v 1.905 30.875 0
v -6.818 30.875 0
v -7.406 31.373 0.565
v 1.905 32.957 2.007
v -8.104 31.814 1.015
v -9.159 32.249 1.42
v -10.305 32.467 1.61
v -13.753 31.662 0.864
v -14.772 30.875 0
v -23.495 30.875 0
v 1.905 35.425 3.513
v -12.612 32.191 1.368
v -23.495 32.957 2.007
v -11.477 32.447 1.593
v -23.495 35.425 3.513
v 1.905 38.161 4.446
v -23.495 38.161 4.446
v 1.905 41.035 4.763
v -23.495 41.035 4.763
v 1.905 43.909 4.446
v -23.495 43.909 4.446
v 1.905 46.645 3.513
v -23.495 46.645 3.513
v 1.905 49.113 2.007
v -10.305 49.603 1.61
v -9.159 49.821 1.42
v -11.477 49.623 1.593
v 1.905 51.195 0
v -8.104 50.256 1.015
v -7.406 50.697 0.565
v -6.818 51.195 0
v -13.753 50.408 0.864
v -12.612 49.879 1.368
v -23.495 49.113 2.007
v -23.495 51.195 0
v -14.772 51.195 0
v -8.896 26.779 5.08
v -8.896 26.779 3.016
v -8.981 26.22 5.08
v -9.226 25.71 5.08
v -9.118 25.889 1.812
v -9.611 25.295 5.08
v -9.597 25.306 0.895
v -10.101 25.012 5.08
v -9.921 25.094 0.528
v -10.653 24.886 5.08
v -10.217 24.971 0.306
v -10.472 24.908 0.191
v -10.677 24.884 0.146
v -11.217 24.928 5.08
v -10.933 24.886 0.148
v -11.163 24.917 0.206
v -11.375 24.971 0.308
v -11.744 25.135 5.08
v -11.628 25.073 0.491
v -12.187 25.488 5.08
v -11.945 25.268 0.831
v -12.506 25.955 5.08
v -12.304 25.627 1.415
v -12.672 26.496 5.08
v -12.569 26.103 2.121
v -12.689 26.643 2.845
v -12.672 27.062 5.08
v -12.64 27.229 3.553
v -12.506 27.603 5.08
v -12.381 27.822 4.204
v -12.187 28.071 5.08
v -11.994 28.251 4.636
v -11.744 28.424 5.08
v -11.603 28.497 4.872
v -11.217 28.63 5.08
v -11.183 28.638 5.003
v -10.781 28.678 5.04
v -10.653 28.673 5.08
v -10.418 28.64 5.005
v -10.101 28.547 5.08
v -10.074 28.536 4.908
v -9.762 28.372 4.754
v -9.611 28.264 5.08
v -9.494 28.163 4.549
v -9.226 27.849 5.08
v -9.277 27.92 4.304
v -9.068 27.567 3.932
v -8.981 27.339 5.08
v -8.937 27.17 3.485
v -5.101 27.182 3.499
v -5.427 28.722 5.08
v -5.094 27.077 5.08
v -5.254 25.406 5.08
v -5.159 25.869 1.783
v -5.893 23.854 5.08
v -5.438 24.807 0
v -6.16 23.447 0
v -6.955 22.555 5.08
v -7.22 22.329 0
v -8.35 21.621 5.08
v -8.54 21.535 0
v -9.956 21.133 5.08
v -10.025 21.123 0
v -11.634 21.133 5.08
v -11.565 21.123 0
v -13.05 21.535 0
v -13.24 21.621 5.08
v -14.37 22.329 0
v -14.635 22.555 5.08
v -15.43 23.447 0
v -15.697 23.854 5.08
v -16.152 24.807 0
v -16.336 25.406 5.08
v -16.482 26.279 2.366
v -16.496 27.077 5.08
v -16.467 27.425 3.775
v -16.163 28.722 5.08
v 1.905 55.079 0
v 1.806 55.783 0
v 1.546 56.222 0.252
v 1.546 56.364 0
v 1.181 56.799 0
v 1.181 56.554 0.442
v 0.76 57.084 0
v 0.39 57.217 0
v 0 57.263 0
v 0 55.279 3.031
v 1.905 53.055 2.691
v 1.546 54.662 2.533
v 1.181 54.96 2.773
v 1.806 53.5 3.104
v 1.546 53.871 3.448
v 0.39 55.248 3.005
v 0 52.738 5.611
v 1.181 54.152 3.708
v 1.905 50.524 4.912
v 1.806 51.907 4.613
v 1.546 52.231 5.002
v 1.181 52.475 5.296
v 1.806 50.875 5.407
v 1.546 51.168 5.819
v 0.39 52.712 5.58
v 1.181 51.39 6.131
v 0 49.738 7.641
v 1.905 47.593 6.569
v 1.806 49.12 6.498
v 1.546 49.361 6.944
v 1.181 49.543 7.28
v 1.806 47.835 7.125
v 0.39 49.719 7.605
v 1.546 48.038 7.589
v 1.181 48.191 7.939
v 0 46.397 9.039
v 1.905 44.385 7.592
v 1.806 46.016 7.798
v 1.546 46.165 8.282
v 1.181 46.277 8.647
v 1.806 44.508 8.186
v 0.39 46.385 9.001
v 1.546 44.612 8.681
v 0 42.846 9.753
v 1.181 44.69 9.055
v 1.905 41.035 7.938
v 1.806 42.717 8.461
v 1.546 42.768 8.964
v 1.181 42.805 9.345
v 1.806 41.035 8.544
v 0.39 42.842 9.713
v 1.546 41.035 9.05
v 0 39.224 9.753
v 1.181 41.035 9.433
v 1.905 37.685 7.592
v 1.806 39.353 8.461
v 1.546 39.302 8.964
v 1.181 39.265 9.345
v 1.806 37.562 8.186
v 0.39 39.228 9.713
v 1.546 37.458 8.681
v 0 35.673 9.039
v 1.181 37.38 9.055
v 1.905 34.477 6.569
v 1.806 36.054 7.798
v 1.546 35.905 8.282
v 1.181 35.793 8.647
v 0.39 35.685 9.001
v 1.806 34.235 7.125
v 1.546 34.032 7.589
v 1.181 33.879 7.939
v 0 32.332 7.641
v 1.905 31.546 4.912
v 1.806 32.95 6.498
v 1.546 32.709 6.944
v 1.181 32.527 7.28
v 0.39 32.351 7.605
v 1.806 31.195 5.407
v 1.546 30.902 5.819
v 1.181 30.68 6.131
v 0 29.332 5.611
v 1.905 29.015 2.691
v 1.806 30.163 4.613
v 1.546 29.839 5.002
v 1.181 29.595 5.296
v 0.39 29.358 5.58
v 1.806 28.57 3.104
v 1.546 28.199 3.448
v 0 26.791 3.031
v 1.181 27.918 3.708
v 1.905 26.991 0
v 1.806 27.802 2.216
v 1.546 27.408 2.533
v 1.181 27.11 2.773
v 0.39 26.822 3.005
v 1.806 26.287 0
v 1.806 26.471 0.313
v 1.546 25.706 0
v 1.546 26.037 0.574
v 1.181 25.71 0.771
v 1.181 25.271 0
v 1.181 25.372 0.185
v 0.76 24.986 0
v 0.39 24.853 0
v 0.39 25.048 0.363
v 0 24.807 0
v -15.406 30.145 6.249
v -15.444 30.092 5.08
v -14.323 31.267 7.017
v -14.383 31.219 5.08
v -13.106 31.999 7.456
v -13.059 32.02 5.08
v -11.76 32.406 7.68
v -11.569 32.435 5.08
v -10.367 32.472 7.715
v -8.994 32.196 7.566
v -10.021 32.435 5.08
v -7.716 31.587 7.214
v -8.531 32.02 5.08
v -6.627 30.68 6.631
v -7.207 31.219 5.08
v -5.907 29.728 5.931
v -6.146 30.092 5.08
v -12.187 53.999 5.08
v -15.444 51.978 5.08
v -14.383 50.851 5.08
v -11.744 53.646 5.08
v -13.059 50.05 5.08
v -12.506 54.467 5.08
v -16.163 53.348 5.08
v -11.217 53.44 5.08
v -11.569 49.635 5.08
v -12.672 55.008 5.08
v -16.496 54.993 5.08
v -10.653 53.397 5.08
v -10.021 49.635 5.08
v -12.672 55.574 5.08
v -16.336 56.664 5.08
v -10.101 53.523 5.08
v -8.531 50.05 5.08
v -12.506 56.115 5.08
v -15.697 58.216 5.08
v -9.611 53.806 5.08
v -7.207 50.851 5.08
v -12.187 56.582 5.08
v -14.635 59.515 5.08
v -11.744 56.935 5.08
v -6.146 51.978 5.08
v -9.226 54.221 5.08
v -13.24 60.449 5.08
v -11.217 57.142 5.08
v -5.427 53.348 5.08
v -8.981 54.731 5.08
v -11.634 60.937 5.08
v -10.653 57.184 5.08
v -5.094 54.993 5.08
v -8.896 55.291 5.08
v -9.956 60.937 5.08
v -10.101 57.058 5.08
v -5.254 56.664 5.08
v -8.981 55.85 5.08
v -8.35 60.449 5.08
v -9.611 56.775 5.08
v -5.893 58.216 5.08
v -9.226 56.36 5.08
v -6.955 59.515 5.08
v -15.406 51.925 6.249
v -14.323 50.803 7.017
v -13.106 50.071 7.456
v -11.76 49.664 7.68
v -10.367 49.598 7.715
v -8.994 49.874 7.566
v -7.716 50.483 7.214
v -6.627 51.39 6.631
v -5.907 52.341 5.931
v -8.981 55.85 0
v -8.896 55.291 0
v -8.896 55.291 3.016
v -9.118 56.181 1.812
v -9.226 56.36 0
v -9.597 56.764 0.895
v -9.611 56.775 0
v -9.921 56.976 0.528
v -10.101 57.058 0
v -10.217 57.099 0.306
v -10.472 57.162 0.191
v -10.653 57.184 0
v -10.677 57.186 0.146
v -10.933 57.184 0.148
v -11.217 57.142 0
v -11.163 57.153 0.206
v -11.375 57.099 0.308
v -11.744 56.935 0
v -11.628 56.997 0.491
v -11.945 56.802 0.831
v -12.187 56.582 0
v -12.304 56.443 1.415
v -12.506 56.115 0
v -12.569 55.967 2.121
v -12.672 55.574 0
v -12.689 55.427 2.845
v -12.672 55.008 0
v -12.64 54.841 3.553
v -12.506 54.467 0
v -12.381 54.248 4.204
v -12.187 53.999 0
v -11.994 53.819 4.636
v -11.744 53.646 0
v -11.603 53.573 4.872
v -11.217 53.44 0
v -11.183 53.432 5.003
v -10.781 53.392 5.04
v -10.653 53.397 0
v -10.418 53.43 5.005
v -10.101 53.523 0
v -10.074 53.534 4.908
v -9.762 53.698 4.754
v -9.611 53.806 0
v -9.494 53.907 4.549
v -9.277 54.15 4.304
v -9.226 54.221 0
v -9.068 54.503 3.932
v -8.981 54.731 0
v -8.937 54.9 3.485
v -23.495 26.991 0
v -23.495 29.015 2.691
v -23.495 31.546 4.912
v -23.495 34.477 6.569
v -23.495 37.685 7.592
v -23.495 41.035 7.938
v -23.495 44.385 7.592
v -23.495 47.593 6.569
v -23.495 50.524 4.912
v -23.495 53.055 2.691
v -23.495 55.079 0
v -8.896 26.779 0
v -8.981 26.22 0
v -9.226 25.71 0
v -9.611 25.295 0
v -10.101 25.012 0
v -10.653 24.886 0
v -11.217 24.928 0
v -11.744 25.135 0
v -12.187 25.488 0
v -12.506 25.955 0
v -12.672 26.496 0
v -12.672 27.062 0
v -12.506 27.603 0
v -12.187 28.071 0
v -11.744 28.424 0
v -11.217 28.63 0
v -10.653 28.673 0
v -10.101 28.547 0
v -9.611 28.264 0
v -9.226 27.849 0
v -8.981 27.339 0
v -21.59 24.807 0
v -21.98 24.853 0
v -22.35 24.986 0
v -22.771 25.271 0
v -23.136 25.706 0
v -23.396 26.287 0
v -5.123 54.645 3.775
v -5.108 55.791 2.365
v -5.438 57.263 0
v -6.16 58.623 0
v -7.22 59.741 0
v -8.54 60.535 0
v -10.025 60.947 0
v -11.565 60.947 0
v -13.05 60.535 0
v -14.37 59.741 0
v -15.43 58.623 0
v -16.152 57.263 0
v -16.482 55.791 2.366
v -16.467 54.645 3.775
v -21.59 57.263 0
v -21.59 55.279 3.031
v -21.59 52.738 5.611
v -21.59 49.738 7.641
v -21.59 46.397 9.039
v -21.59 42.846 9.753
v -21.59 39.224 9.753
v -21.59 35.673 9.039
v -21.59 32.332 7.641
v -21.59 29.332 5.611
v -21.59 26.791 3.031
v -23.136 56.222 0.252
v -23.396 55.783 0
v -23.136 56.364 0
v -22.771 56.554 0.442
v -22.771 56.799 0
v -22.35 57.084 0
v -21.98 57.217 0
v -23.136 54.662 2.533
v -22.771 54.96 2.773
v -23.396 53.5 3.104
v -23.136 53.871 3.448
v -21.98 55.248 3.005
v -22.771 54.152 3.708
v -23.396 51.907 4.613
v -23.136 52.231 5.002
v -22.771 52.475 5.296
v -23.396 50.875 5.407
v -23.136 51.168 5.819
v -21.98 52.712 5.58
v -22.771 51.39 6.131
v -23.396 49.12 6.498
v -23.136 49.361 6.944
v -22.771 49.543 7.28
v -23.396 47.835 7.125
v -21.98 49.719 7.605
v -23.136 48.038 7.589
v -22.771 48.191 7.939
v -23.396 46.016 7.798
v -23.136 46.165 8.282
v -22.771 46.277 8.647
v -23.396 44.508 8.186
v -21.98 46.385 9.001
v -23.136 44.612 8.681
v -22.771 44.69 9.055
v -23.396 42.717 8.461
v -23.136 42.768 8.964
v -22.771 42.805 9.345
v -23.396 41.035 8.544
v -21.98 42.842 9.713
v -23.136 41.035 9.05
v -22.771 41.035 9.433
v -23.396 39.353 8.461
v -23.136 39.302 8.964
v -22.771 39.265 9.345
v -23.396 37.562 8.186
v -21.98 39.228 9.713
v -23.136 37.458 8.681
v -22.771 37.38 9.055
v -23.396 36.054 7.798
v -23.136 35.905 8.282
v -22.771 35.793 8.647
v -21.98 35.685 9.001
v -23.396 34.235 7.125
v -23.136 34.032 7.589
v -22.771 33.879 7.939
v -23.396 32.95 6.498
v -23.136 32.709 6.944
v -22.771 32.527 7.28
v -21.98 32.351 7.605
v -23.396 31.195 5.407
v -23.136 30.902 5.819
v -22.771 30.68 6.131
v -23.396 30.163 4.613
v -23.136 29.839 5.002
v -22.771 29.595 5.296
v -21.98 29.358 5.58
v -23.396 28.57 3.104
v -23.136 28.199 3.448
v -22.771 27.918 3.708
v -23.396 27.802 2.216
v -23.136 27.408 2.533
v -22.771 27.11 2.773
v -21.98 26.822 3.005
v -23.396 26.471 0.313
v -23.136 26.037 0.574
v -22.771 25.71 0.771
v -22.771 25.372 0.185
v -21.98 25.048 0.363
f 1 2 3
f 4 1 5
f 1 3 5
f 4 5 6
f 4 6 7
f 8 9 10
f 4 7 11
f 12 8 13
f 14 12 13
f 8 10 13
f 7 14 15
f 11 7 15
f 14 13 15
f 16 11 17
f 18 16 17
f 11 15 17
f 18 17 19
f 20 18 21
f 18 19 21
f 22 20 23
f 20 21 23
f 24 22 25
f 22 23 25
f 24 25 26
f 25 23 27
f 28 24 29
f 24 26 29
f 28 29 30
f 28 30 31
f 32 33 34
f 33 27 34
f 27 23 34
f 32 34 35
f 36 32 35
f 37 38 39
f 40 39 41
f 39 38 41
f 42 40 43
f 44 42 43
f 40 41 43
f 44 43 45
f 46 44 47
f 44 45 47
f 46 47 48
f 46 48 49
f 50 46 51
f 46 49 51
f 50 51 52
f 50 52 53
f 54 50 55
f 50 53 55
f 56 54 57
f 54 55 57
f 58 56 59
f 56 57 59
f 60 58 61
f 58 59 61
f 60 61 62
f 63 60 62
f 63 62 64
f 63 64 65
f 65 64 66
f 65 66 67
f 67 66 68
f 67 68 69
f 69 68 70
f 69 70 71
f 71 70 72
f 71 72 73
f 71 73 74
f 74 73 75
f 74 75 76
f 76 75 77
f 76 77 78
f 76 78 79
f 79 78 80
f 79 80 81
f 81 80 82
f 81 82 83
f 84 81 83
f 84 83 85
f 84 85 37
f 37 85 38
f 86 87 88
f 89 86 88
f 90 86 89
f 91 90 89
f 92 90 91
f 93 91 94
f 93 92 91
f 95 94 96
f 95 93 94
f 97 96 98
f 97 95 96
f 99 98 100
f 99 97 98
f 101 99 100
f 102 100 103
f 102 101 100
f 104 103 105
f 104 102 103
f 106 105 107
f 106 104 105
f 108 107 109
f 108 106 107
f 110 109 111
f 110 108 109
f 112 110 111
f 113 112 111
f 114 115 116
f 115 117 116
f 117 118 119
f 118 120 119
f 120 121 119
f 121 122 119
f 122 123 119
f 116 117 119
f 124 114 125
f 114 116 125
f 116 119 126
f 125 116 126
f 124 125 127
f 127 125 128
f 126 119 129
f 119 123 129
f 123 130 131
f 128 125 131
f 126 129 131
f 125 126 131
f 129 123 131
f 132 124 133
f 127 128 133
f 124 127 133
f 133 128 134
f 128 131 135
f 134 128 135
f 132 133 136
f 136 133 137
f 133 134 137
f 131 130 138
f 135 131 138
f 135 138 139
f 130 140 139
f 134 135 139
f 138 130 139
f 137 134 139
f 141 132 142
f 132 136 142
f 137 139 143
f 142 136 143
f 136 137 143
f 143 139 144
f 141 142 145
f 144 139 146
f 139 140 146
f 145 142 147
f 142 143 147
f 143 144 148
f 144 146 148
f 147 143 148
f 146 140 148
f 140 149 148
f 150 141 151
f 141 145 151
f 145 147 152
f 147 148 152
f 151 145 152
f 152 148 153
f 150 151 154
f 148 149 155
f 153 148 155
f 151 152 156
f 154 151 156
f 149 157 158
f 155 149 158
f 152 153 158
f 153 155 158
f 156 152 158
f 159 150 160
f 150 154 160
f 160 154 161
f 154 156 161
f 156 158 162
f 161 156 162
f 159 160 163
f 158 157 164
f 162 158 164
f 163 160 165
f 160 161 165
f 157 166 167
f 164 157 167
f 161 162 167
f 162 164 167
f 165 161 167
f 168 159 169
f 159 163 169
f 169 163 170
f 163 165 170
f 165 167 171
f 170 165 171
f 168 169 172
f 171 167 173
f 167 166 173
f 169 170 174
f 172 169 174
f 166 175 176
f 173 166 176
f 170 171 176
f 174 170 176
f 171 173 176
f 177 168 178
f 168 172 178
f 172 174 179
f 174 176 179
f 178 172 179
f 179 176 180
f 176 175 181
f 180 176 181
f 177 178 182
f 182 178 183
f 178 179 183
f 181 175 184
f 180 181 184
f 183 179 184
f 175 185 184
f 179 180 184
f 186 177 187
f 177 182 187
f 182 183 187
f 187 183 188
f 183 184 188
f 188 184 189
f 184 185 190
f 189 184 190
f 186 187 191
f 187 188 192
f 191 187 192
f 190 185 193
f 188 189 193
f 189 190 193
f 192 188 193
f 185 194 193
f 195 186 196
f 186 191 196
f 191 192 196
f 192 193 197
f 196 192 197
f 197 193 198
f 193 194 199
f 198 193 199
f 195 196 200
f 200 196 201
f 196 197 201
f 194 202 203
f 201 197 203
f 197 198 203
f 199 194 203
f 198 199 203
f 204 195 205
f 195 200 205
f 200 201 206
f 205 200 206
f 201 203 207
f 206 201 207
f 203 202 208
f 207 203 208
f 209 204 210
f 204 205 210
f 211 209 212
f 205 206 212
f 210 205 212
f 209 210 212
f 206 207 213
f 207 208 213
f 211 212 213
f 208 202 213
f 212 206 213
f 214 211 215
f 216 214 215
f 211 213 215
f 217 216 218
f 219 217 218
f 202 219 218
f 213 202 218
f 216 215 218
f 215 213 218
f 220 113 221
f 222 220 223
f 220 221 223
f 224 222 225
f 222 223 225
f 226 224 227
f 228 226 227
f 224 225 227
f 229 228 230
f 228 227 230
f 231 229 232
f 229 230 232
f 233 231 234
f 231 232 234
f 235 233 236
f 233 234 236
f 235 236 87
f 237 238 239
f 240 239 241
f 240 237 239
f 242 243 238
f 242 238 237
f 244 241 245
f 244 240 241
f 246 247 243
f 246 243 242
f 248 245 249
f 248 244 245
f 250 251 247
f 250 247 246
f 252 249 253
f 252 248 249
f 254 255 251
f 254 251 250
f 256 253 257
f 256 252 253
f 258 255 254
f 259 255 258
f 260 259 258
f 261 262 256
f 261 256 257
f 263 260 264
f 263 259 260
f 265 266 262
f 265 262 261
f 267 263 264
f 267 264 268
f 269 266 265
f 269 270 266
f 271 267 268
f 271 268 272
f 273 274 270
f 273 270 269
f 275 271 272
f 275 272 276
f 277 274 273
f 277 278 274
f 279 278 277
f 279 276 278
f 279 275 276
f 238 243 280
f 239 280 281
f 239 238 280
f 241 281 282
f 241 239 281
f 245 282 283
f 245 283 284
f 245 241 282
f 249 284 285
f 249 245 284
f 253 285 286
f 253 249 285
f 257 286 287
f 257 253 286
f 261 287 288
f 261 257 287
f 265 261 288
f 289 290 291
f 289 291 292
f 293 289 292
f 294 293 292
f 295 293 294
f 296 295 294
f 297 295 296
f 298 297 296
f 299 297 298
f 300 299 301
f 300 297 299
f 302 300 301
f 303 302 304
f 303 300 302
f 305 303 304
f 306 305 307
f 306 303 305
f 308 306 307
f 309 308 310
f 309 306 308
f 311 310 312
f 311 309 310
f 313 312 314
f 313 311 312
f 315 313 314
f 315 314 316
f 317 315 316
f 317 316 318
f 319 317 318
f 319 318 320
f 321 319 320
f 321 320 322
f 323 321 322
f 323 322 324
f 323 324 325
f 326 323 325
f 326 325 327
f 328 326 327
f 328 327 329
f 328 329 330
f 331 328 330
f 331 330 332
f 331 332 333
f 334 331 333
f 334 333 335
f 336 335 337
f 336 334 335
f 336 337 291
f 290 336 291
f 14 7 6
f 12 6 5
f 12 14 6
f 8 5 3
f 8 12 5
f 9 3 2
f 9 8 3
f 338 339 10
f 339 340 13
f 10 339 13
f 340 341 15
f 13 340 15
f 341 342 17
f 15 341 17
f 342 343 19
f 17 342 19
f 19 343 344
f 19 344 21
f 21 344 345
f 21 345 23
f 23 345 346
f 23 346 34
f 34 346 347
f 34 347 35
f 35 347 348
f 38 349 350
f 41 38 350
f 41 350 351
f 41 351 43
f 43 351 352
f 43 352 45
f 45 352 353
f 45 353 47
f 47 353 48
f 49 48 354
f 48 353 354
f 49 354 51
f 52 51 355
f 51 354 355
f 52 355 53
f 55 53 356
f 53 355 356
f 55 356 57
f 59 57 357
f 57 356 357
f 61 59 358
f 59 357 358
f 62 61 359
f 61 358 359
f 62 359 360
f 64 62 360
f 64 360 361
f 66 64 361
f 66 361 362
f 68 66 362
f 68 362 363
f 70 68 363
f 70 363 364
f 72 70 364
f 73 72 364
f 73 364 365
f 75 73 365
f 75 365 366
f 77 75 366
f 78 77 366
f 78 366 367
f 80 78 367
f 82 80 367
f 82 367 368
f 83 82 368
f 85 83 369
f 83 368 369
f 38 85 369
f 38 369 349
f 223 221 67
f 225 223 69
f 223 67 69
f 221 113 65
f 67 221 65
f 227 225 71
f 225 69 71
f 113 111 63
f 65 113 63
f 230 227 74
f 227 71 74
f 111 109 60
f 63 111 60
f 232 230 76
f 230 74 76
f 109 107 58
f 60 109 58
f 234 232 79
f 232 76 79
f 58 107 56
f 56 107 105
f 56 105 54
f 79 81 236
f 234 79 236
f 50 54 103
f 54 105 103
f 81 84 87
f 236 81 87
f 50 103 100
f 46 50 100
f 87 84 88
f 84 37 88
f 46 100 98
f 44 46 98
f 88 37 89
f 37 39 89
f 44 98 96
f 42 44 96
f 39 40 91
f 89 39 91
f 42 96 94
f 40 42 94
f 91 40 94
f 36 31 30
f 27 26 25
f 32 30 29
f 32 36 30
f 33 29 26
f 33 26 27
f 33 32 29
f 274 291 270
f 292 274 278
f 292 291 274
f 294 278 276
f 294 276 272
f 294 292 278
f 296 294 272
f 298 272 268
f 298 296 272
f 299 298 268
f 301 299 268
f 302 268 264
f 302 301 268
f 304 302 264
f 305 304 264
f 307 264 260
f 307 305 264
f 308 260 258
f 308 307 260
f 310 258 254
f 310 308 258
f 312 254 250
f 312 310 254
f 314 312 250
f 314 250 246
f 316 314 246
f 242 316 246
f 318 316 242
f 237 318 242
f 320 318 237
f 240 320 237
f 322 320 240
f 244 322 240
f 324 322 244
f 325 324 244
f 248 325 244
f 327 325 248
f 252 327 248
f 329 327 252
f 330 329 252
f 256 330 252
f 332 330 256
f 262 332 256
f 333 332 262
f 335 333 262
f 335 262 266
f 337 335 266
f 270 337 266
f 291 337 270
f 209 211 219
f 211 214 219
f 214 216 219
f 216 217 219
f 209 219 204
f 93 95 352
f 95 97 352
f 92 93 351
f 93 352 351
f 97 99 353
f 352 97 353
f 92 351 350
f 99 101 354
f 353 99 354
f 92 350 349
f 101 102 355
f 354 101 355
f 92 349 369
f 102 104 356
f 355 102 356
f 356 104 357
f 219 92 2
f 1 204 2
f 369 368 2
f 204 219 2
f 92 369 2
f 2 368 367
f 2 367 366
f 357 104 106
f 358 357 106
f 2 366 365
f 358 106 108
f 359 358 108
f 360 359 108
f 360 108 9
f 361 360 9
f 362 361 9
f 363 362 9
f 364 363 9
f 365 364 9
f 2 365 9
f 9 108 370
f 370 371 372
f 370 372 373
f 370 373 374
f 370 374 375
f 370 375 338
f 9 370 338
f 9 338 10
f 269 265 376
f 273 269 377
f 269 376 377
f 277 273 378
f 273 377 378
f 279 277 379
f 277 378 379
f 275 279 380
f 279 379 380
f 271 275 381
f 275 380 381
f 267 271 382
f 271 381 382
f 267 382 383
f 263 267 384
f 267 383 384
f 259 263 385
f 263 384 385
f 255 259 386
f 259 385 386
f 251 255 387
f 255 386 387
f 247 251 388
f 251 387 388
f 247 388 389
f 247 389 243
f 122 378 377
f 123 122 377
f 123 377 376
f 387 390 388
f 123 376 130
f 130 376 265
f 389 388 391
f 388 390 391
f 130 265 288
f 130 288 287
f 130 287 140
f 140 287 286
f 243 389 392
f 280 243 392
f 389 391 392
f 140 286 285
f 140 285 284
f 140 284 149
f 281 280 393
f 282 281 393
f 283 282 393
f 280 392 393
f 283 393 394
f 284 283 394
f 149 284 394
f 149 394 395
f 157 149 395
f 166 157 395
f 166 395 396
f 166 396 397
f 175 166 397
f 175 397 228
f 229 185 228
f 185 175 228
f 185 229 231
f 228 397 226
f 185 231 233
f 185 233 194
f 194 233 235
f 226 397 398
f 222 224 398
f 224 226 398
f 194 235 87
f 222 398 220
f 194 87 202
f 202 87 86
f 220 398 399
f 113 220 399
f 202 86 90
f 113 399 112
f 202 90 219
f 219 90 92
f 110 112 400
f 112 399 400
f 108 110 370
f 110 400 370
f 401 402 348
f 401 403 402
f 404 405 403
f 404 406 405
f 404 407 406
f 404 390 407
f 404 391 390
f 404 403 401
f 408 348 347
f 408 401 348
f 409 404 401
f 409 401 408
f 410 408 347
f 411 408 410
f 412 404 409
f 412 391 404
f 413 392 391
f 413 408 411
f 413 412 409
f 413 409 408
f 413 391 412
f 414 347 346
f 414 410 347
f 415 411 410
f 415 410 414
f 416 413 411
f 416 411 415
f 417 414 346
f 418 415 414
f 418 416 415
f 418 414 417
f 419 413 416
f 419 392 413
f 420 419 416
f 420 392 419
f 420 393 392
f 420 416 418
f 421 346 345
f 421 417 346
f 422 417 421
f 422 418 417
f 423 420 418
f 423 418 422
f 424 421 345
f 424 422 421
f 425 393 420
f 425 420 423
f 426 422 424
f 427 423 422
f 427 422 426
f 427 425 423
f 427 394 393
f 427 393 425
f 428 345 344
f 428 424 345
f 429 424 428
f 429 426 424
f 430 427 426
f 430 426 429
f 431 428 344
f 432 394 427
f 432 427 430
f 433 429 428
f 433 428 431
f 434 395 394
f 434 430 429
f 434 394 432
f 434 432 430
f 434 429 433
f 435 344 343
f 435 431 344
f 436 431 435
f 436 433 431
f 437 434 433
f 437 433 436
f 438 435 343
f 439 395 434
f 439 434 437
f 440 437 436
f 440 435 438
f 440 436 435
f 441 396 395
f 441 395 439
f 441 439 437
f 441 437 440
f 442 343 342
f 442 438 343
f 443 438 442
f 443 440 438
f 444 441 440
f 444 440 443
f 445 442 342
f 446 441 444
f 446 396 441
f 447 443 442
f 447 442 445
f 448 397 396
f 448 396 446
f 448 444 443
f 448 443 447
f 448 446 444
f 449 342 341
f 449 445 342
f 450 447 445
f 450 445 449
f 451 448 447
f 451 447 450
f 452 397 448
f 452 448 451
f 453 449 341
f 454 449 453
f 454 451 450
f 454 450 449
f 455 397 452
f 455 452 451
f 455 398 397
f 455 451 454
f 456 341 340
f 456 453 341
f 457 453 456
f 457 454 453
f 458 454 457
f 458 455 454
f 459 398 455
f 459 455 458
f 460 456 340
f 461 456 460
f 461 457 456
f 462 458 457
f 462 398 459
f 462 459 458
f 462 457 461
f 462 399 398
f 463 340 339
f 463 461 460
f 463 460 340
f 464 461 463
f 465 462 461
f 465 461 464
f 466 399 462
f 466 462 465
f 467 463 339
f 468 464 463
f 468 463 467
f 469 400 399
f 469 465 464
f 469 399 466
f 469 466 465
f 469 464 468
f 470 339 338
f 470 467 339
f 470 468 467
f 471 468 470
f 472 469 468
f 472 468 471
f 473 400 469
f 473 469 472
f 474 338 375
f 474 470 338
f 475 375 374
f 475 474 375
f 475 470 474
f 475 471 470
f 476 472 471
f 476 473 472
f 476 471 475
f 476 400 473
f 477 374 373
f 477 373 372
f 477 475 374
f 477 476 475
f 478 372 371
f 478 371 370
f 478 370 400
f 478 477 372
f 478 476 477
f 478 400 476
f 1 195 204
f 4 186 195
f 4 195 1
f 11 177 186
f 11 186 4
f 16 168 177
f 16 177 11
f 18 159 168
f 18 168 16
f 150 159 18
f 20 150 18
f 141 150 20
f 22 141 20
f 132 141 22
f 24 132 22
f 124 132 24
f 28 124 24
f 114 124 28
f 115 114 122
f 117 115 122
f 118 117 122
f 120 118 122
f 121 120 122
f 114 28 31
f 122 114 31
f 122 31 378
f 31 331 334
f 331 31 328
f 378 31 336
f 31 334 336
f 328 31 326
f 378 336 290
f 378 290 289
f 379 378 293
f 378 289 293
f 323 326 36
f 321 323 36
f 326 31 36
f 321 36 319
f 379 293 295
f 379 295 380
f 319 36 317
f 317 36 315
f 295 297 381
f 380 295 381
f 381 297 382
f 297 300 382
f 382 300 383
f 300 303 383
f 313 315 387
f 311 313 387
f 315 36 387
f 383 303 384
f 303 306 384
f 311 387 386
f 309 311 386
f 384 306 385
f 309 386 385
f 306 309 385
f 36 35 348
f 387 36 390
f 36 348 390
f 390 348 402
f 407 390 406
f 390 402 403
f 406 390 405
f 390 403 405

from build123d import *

# Parameters (mm, degrees)
BOSS_EXTRUDE2_DEPTH = 25.4
CUT_EXTRUDE7_START  = -1
SKETCH5_5_R         = 1.89865
CUT_EXTRUDE7_DEPTH  = 11.8425
SKETCH8_R           = 5.70865
SKETCH8_R_2         = 1.89865
BOSS_EXTRUDE4_DEPTH = 5.08
CUT_EXTRUDE8_START  = 5.08
SKETCH8_3_R         = 5.70865
SKETCH8_3_R_2       = 1.89865
CUT_EXTRUDE8_DEPTH  = 5.7625001
CUT_EXTRUDE3_DEPTH  = 26.4000001
FILLET3_R           = 1.905


with BuildPart() as part:
    # Sketch4 → Boss-Extrude2 (new body)
    with BuildSketch(Plane(origin=(-23.495, 41.0349954, 0), x_dir=(0, 0, 1), z_dir=(-1, 0, 0))):
        with BuildLine():
            ThreePointArc((0, 16.227532365), (9.8425, 0), (0, -16.227532365))
            Line((0, -16.227532365), (0, -10.16))
            ThreePointArc((0, -10.16), (4.7625, 0), (0, 10.16))
            Line((0, 10.16), (0, 16.227532365))
        make_face()
    extrude(amount=-BOSS_EXTRUDE2_DEPTH)

    # Sketch5_5 → Cut-Extrude7 (cut)
    with BuildSketch(Plane.XY.offset(CUT_EXTRUDE7_START)):
        with Locations((-10.795, 55.2907454)):
            Circle(SKETCH5_5_R)
    cut_extrude7 = extrude(amount=CUT_EXTRUDE7_DEPTH, mode=Mode.SUBTRACT)

    # Sketch8 → Boss-Extrude4 (add)
    with BuildSketch(Plane.XY):
        with Locations((-10.795, 55.2907454)):
            Circle(SKETCH8_R)
        with Locations((-10.795, 55.2907454)):
            Circle(SKETCH8_R_2, mode=Mode.SUBTRACT)
    boss_extrude4 = extrude(amount=BOSS_EXTRUDE4_DEPTH)

    # Sketch8_3 → Cut-Extrude8 (cut, through all)
    with BuildSketch(Plane.XY.offset(CUT_EXTRUDE8_START)):
        with Locations((-10.795, 55.2907454)):
            Circle(SKETCH8_3_R)
        with Locations((-10.795, 55.2907454)):
            Circle(SKETCH8_3_R_2, mode=Mode.SUBTRACT)
    cut_extrude8 = extrude(amount=CUT_EXTRUDE8_DEPTH, mode=Mode.SUBTRACT)

    # Mirror1: Cut-Extrude7, Boss-Extrude4, Cut-Extrude8 across plane
    add(cut_extrude7.mirror(Plane.ZX.offset(41.0349954)), mode=Mode.SUBTRACT)
    add(boss_extrude4.mirror(Plane.ZX.offset(41.0349954)))
    add(cut_extrude8.mirror(Plane.ZX.offset(41.0349954)), mode=Mode.SUBTRACT)

    # Sketch4_3 → Cut-Extrude3 (cut, through all)
    with BuildSketch(Plane(origin=(-23.495, 41.0349954, 0), x_dir=(0, 0, 1), z_dir=(-1, 0, 0))):
        with BuildLine():
            ThreePointArc((0, 10.16), (4.7625, 0), (0, -10.16))
            Line((0, -10.16), (0, 10.16))
        make_face()
    extrude(amount=-CUT_EXTRUDE3_DEPTH, mode=Mode.SUBTRACT)

    # Fillet3
    fillet3_edges = [part.edges().sort_by_distance(p)[0] for p in [
        (1.905, 41.0349954, 9.8425),
        (-23.495, 41.0349954, 9.8425),
    ]]
    fillet(fillet3_edges, radius=FILLET3_R)


solid = part.part
